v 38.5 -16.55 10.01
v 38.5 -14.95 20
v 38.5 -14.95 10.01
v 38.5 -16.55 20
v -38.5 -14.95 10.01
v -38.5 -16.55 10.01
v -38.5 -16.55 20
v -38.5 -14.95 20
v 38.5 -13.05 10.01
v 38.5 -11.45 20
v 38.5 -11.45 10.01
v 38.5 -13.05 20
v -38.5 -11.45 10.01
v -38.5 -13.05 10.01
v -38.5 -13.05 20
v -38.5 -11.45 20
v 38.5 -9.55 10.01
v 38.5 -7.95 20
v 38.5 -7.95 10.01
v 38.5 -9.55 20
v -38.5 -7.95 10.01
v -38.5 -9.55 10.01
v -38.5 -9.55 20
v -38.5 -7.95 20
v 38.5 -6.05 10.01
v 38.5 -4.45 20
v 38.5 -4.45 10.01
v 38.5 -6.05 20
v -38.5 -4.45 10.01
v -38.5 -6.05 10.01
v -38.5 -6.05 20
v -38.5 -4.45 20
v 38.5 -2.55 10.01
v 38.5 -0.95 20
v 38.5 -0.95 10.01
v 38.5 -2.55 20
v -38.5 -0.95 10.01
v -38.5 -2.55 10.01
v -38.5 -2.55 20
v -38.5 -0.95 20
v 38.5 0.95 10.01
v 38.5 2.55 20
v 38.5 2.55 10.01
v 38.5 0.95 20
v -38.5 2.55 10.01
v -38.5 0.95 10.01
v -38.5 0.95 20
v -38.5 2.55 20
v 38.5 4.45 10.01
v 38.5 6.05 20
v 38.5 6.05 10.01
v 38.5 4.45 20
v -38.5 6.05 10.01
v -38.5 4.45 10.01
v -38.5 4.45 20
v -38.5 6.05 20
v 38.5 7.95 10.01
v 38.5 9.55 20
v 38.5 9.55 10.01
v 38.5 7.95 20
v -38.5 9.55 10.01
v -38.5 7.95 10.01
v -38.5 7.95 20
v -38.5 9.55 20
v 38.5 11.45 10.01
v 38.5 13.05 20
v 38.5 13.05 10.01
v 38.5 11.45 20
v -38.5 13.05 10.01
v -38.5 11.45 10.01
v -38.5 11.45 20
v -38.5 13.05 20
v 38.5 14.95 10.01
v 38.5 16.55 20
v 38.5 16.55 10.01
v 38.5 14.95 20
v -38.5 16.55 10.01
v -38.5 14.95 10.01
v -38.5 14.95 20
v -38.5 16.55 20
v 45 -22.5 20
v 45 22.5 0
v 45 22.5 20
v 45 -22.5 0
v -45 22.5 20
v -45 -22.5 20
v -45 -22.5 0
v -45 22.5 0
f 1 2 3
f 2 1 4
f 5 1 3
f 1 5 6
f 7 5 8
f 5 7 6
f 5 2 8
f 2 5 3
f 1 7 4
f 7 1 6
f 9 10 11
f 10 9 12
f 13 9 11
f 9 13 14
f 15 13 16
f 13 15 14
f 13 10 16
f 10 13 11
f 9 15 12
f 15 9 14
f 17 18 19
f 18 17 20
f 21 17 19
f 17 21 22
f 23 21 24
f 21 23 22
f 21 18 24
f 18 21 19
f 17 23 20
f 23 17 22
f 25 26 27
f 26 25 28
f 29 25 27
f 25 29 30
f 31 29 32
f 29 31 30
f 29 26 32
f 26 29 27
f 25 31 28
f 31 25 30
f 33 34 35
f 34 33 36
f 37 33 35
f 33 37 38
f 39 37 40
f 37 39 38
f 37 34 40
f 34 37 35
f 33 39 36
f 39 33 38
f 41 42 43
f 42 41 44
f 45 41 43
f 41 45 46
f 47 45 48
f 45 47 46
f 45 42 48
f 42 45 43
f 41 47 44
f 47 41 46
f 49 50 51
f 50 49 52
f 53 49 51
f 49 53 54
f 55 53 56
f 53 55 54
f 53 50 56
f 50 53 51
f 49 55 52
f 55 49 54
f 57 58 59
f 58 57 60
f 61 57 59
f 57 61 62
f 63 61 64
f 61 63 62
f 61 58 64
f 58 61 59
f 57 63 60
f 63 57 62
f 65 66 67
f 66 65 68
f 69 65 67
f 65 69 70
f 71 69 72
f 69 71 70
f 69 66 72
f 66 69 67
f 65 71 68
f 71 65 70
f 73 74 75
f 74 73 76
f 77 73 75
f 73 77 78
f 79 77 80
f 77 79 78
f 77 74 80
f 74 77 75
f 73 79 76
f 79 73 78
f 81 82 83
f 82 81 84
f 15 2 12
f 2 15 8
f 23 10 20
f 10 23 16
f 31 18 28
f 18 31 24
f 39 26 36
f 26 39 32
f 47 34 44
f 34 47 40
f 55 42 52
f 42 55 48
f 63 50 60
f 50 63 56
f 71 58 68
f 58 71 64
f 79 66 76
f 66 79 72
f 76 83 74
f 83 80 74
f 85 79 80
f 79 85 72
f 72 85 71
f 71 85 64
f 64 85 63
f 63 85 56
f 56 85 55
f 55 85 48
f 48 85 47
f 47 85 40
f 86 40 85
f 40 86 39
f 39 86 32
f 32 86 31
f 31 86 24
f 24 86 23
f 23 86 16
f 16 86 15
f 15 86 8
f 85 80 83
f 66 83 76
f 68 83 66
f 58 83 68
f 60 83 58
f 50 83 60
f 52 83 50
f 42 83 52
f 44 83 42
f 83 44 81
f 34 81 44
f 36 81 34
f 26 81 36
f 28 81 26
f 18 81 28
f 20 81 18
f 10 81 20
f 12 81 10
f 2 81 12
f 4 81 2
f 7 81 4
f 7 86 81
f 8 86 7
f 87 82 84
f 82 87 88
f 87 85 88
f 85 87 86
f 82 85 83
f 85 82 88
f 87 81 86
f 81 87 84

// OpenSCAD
// Microscope Slide Drying Rack
// Designed for 10 slides (75x25x1mm) standing upright on long edge.

// Block Dimensions
L = 90;             // Length (X)
W = 45;             // Width (Y)
H = 20;             // Height (Z)

// Slot Dimensions
slot_L = 77;        // Slot length (X)
slot_W = 1.6;       // Slot width (Y)
slot_D = 10;        // Slot depth (Z)
num_slots = 10;     // Number of slots
pitch = 3.5;        // Center-to-center spacing (Y)

$fn = 64;

// Calculate the starting Y position to center the group of slots
y_offset = ((num_slots - 1) * pitch) / 2;

difference() {
    // The main solid base block
    // Centered on X and Y, sitting on Z=0
    translate([-L/2, -W/2, 0]) {
        cube([L, W, H]);
    }

    // The slots
    for (i = [0 : num_slots - 1]) {
        // Calculate Y center for this specific slot
        slot_y_pos = (i * pitch) - y_offset;
        
        // To ensure the hole is exactly 77mm wide while avoiding coplanar faces:
        // We use the exact slot_L for the cube width.
        // We translate the cube so it is centered on the block's X axis.
        // We extend the cube in Z to ensure it cuts through the top face.
        translate([-slot_L/2, slot_y_pos - slot_W/2, H - slot_D + 0.01]) {
            cube([slot_L, slot_W, slot_D + 0.01]);
        }
    }
}
